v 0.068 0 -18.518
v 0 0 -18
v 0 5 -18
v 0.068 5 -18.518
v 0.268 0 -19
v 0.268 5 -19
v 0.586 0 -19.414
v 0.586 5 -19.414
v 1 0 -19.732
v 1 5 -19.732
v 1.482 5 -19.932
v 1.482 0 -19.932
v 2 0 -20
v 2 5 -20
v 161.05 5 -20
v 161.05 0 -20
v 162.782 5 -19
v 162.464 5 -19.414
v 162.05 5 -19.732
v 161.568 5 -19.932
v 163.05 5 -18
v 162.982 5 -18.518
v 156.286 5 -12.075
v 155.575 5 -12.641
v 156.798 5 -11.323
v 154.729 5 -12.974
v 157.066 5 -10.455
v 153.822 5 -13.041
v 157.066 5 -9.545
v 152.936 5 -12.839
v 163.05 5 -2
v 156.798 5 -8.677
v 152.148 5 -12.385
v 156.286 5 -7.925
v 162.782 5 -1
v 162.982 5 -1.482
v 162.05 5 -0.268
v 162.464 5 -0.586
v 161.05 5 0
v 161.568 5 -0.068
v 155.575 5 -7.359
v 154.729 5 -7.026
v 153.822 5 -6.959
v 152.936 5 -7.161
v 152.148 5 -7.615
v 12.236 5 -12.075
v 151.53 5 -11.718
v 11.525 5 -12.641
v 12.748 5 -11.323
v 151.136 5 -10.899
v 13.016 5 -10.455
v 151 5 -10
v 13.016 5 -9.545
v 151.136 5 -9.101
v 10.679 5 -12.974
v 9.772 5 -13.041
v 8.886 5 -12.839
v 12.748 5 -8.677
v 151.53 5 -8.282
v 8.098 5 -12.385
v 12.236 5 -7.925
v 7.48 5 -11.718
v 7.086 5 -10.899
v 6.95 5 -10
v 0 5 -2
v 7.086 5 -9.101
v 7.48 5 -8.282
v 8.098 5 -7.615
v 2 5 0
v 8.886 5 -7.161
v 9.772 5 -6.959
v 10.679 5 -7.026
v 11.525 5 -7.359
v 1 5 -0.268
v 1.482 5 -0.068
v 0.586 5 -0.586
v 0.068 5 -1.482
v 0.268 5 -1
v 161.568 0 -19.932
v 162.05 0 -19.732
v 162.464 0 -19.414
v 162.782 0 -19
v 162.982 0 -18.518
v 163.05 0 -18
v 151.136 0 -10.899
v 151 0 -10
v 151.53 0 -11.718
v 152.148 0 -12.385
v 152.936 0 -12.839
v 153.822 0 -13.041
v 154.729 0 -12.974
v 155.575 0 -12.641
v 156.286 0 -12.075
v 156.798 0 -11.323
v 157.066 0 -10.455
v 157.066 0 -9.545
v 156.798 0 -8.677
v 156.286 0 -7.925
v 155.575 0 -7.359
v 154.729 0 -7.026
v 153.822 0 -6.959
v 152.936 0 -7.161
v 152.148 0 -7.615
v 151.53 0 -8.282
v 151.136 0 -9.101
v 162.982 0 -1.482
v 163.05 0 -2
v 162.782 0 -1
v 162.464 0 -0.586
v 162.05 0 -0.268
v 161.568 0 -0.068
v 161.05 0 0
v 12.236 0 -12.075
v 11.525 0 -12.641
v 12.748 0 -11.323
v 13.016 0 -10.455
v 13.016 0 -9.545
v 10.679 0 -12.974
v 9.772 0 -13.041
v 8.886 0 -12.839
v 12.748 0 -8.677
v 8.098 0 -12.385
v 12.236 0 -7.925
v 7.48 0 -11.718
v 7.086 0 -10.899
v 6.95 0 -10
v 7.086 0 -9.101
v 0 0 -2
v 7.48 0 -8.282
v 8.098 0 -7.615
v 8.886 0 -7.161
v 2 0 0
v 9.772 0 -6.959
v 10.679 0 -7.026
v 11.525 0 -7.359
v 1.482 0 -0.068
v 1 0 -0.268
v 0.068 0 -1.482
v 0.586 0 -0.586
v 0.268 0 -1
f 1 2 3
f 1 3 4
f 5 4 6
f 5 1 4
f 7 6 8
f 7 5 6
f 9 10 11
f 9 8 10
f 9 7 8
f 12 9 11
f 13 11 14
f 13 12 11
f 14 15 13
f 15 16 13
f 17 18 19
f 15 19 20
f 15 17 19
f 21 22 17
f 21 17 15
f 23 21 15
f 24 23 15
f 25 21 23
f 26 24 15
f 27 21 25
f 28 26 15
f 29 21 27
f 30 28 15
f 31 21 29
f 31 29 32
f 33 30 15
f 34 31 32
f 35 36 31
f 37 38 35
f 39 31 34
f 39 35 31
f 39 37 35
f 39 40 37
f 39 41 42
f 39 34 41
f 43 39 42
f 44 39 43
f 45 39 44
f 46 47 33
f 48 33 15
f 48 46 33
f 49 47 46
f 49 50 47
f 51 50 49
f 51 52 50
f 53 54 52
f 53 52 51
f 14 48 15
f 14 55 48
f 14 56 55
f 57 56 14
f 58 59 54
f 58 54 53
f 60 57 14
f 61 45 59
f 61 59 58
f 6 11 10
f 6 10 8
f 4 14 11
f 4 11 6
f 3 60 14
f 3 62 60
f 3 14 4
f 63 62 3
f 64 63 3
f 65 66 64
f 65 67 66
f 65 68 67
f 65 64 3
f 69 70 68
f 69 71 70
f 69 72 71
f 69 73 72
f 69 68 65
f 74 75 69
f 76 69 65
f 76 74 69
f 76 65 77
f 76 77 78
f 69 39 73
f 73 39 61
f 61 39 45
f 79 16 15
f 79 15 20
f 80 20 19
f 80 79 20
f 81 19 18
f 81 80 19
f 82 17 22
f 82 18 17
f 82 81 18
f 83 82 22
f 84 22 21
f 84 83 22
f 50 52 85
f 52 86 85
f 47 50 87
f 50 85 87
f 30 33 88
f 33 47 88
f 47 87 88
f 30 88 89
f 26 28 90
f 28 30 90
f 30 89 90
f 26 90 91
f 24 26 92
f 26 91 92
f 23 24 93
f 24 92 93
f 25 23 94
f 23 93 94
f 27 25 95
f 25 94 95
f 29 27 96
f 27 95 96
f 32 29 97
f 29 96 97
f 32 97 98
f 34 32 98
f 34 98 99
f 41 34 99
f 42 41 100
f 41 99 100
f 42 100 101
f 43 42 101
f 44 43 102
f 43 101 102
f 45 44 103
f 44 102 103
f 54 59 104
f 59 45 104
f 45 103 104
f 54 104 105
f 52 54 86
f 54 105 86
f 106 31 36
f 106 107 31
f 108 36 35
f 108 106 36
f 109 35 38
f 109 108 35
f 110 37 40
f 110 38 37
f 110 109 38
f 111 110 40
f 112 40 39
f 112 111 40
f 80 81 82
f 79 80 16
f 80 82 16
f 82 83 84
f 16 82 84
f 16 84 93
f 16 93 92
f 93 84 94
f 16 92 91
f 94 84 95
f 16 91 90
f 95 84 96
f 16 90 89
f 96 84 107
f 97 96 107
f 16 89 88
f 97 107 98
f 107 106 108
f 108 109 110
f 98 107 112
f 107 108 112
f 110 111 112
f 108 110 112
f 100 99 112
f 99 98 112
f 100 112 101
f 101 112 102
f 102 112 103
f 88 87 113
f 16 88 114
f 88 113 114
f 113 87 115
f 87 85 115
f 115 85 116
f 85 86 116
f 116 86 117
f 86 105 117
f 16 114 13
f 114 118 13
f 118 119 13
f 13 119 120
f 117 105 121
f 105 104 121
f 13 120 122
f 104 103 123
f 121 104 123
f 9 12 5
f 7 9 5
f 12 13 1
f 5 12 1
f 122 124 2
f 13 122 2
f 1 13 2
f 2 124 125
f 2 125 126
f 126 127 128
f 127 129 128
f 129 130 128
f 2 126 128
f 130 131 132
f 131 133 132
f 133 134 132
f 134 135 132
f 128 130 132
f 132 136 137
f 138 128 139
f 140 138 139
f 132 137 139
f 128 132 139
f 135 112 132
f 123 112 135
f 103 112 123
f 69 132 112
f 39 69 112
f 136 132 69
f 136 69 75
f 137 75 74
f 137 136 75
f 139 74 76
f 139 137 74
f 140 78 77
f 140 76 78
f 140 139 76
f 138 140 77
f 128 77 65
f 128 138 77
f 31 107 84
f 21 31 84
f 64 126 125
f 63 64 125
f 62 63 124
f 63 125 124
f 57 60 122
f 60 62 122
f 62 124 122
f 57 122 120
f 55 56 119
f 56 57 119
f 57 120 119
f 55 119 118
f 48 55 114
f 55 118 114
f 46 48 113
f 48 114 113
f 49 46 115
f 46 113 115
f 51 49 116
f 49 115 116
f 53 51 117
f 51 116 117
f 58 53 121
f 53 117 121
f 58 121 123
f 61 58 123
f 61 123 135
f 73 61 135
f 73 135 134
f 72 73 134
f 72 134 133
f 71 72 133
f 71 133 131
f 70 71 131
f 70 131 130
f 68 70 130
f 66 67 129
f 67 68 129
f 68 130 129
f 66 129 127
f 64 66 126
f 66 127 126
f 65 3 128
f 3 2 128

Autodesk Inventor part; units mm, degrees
ref_plane "YZ Plane" through (0, 0, 0) normal (1, 0, 0) x (0, 1, 0)
ref_plane "XZ Plane" through (0, 0, 0) normal (0, 1, 0) x (-1, 0, 0)
ref_plane "XY Plane" through (0, 0, 0) normal (0, 0, 1) x (1, 0, 0)
sketch "Skizze1" plane through (0, 0, 0) normal (0, 1, 0) x (-1, 0, 0)
  line L0 (-2, 0) -> (-161.05, 0)
  line L1 (-163.05, -2) -> (-163.05, -18)
  line L2 (-161.05, -20) -> (-2, -20)
  line L3 (0, -18) -> (0, -2)
  circle A0 centre (-154.05, -10) radius 3.05
  line L4 (0, -10) -> (-163.05, -10) construction
  line L5 (-163.05, -20) -> (-164.05, -20) construction
  line L6 (-164.05, -20) -> (-164.05, -1) construction
  line L7 (-164.05, -1) -> (-163.05, -1) construction
  line L8 (-163.05, -1) -> (-163.05, -20) construction
  line L9 (-164.05, -20) -> (-169.05, -20) construction
  line L10 (-169.05, -20) -> (-169.05, -1) construction
  line L11 (-169.05, -1) -> (-164.05, -1) construction
  line L12 (-164.05, -1) -> (-164.05, -20) construction
  circle A1 centre (-10, -10) radius 3.05
  line L13 (-13.05, -20) -> (-13.05, 0) construction
  arc A2 (-2, -20) -> (0, -18) centre (-2, -18) ccw
  arc A3 (0, -2) -> (-2, 0) centre (-2, -2) ccw
  arc A4 (-163.05, -18) -> (-161.05, -20) centre (-161.05, -18) ccw
  arc A5 (-161.05, 0) -> (-163.05, -2) centre (-161.05, -2) ccw
  point P0 (0, 0)
  point P1 (0, -20)
  dimension "d0" = 20
  dimension "d2" = 5
  dimension "d3" = 1
  dimension "d5" = 10
  dimension "d6" = 6.1
  dimension "d7" = 156
  dimension "d8" = 10
  dimension "d9" = 6.1
  dimension "d10" = 2
extrude "Extrusion1" add sketch "Skizze1" along normal blind 5
properties part number "Slider_Winkel_Abstandshalter"
